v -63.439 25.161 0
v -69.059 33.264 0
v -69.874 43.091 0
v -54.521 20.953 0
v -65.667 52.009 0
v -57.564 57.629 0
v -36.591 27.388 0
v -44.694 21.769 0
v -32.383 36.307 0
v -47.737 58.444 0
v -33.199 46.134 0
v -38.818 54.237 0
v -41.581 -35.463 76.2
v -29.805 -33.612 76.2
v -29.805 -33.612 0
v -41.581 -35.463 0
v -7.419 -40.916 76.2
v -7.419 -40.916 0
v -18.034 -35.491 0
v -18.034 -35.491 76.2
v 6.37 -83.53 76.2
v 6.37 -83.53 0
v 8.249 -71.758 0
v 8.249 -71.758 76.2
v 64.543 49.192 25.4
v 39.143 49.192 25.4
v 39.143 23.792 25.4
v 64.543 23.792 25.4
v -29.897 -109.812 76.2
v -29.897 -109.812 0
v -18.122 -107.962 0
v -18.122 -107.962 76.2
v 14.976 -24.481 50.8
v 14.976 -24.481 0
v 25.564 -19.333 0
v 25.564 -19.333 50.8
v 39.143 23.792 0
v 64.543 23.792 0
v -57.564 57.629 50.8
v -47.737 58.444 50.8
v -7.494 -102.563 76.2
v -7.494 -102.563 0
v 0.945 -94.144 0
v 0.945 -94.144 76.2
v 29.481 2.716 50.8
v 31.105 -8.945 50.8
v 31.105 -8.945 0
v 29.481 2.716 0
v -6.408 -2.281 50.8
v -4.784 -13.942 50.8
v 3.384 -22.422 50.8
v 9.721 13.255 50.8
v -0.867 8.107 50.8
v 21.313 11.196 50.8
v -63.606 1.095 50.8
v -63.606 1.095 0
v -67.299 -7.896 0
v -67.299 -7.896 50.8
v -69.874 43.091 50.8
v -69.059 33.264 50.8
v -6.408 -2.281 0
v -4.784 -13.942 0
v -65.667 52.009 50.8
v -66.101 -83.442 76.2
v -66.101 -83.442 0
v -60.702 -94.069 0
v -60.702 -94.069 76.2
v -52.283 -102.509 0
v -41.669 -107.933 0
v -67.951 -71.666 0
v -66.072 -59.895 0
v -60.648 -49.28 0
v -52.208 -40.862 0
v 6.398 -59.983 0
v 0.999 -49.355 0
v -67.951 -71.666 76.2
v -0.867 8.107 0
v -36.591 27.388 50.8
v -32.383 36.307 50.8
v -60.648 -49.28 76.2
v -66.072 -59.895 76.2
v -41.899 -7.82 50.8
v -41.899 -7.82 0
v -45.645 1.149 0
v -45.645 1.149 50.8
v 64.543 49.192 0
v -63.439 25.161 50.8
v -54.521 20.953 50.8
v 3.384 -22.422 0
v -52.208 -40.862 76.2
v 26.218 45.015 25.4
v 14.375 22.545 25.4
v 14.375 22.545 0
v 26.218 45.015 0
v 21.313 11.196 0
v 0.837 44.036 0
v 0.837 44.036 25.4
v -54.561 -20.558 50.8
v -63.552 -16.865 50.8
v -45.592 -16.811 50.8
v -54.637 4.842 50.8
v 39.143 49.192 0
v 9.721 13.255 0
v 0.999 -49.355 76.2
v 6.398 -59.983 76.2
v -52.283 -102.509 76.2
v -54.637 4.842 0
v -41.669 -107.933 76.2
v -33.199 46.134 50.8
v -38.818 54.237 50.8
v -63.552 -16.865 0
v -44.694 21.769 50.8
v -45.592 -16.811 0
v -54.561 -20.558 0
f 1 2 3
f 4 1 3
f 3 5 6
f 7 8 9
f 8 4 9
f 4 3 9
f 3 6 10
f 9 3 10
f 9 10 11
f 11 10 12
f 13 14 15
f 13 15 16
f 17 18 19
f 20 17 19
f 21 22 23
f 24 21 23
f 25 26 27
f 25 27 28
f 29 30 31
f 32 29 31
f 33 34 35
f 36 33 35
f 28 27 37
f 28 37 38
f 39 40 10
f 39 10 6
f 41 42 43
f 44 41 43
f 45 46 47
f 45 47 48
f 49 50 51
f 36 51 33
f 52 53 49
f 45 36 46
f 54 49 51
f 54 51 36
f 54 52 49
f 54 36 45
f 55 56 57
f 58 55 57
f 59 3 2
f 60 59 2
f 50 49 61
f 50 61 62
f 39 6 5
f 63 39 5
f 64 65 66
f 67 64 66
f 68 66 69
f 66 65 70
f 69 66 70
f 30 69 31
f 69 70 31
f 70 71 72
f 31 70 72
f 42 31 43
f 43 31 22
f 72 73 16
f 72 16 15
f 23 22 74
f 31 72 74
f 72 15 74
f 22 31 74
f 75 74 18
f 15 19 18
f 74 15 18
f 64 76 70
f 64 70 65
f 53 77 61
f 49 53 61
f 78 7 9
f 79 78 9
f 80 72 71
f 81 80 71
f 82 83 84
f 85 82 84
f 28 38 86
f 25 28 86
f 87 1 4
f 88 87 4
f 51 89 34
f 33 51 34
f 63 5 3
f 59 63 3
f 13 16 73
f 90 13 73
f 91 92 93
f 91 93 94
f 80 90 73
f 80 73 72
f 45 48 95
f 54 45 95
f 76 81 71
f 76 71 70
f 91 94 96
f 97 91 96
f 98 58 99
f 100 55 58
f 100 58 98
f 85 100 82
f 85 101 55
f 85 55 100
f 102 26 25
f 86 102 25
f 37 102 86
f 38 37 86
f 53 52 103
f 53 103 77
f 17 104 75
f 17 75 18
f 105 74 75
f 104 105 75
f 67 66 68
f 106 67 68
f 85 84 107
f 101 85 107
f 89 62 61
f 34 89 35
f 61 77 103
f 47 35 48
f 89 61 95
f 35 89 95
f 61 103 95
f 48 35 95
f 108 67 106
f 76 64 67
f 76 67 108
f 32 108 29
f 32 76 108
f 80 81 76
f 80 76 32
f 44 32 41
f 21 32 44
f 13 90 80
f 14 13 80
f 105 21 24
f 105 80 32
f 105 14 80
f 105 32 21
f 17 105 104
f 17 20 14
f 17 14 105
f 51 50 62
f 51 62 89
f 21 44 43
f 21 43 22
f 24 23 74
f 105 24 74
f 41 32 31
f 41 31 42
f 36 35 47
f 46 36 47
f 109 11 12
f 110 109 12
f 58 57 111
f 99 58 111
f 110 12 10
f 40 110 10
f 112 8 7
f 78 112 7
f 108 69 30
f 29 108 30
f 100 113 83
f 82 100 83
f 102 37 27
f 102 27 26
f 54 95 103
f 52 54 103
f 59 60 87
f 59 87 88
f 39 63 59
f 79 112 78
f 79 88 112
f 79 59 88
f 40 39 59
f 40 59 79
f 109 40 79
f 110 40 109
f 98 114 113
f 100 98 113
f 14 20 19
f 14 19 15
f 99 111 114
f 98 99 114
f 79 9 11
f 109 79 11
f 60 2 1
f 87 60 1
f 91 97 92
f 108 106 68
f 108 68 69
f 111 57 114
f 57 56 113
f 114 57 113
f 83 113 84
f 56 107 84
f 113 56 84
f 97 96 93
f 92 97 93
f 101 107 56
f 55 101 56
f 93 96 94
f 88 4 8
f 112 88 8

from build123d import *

# Parameters (mm, degrees)
F1_DEPTH  = 25.4
F3_DEPTH  = 50.8
F4_W      = 25.4
F4_H      = 25.4
F5_DEPTH  = 25.4
F7_DEPTH  = 50.8
F9_DEPTH  = 50.8
F11_DEPTH = 76.2


with BuildPart() as f1:
    # F0 (on Top) → F1 (new body)
    with BuildSketch(Plane.XY):
        Polygon((14.375285, 22.544568), (26.217762, 45.014898), (0.836647, 44.035619), align=None)
    extrude(amount=F1_DEPTH)


with BuildPart() as f3:
    # F2 (on Top) → F3 (new body)
    with BuildSketch(Plane.XY):
        Polygon((-44.693661, 21.768669), (-36.590726, 27.388445), (-32.383267, 36.306781), (-33.198668, 46.134016), (-38.818444, 54.236951), (-47.73678, 58.44441), (-57.564015, 57.629009), (-65.66695, 52.009233), (-69.874409, 43.090897), (-69.059008, 33.263662), (-63.439232, 25.160727), (-54.520897, 20.953268), align=None)
    extrude(amount=F3_DEPTH)


with BuildPart() as f5:
    # F4 (on Top) → F5 (new body)
    with BuildSketch(Plane.XY):
        with Locations((51.843213, 36.49176)):
            Rectangle(F4_W, F4_H)
    extrude(amount=F5_DEPTH)


with BuildPart() as f7:
    # F6 (on Top) → F7 (new body)
    with BuildSketch(Plane.XY):
        Polygon((-45.591591, -16.811484), (-41.89872, -7.820144), (-45.645303, 1.148947), (-54.636643, 4.841819), (-63.605735, 1.095235), (-67.298606, -7.896105), (-63.552023, -16.865197), (-54.560683, -20.558068), align=None)
    extrude(amount=F7_DEPTH)


with BuildPart() as f9:
    # F8 (on Top) → F9 (new body)
    with BuildSketch(Plane.XY):
        Polygon((25.564376, -19.333101), (31.10487, -8.944677), (29.481061, 2.716355), (21.313189, 11.195877), (9.721104, 13.255), (-0.867412, 8.107209), (-6.407905, -2.281215), (-4.784096, -13.942247), (3.383776, -22.421769), (14.975861, -24.480892), align=None)
    extrude(amount=F9_DEPTH)


with BuildPart() as f11:
    # F10 (on Top) → F11 (new body)
    with BuildSketch(Plane.XY):
        Polygon((8.248817, -71.758364), (6.398333, -59.982566), (0.999498, -49.354948), (-7.419215, -40.915814), (-18.033722, -35.491246), (-29.805002, -33.612239), (-41.5808, -35.462722), (-52.208419, -40.861558), (-60.647552, -49.280271), (-66.07212, -59.894778), (-67.951127, -71.666058), (-66.100644, -83.441856), (-60.701808, -94.069474), (-52.283096, -102.508608), (-41.668588, -107.933175), (-29.897308, -109.812183), (-18.121511, -107.961699), (-7.493892, -102.562864), (0.945242, -94.144151), (6.369809, -83.529644), align=None)
    extrude(amount=F11_DEPTH)


solid = Compound([f1.part, f3.part, f5.part, f7.part, f9.part, f11.part])
